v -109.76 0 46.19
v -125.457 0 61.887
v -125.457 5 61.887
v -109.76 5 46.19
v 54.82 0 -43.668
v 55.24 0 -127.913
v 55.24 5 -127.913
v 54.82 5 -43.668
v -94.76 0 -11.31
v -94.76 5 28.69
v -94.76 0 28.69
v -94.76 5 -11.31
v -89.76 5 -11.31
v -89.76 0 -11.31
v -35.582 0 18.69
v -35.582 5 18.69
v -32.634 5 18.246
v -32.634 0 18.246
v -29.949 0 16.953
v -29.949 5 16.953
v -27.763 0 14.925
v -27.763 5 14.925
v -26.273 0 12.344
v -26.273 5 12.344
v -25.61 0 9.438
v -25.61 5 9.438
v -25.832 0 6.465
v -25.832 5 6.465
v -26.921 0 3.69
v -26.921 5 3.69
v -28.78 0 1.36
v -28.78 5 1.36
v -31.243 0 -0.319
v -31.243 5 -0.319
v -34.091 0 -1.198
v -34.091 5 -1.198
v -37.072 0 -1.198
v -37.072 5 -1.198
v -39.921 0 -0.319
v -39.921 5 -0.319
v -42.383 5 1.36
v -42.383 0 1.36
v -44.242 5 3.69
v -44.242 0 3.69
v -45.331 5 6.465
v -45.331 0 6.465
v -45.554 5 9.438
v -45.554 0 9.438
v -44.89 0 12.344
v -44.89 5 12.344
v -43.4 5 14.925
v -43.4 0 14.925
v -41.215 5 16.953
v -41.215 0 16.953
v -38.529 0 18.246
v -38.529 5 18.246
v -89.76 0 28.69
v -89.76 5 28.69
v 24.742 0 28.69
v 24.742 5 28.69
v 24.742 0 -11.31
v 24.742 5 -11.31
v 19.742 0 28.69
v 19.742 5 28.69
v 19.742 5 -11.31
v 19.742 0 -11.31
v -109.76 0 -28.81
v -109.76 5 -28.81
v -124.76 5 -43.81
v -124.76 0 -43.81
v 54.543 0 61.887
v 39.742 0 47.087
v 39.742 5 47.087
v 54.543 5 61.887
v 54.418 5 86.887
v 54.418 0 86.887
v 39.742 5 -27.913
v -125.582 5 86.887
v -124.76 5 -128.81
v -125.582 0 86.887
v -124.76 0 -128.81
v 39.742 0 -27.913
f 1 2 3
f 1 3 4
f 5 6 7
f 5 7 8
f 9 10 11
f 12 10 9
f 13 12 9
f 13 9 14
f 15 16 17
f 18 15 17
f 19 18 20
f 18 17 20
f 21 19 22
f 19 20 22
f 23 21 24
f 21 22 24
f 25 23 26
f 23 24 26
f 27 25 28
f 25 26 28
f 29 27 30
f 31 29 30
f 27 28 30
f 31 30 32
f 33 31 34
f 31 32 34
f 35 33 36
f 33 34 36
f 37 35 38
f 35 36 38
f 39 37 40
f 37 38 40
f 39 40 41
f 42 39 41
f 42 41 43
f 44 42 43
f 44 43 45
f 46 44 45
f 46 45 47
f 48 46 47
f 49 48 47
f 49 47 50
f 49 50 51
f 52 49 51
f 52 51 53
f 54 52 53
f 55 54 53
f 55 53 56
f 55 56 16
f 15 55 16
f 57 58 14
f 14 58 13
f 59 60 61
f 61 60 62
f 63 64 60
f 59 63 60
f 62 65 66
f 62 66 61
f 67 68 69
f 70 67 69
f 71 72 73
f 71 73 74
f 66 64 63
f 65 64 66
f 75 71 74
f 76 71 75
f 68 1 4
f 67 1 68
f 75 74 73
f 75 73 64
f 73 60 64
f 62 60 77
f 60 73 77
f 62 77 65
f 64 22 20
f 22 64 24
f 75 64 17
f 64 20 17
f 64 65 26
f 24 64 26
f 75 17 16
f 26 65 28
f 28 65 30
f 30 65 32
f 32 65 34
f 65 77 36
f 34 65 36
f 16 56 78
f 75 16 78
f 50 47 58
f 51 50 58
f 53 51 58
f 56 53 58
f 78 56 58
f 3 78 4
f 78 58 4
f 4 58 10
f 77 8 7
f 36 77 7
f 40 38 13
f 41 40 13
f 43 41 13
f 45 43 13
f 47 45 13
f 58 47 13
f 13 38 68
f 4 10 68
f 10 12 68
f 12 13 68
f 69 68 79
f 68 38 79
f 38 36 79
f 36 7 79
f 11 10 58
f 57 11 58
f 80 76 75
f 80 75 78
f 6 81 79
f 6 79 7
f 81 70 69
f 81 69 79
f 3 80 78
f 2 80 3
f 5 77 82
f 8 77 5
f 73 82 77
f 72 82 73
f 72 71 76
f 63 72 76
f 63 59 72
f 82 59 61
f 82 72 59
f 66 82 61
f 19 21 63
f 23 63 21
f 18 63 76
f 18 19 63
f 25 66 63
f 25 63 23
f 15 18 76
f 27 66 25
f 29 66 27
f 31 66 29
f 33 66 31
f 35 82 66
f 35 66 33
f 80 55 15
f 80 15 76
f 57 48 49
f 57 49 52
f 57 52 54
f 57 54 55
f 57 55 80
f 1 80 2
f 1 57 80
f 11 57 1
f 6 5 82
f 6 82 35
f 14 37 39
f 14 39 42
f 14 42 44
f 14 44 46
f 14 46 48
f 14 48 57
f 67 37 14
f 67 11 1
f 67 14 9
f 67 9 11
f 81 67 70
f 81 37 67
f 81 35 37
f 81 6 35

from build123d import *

# Parameters (mm, degrees)
BOSS_EXTRUDE1_DEPTH = 5
CUT_EXTRUDE2_DEPTH  = 5
SKETCH5_W           = 5
SKETCH5_H           = 40
CUT_EXTRUDE3_DEPTH  = 10
SKETCH6_R           = 10
CUT_EXTRUDE4_DEPTH  = 10


with BuildPart() as part:
    # Sketch2 → Boss-Extrude1 (new body)
    with BuildSketch(Plane(origin=(0, 0, 0), x_dir=(1, 0, 0), z_dir=(0, 1, 0))):
        Polygon((-124.760229314, 128.809560066), (55.239770686, 127.913370731), (54.741887722, 27.913370731), (39.741887722, 27.913370731), (39.741887722, -47.086629269), (54.542734536, -61.887476084), (54.418263795, -86.887476084), (-125.581736205, -86.887476084), (-125.457265464, -61.887476084), (-109.760229314, -46.190439934), (-109.760229314, 28.809560066), (-124.760229314, 28.809560066), align=None)
    extrude(amount=BOSS_EXTRUDE1_DEPTH)

    # Sketch4 → Cut-Extrude2 (cut)
    with BuildSketch(Plane(origin=(0, 5, 0), x_dir=(1, 0, 0), z_dir=(0, 1, 0))):
        Polygon((-109.760229314, 28.809560066), (-124.760229314, 43.809560066), (-124.760229314, 28.809560066), align=None)
        Polygon((39.741887722, 27.913370731), (54.820327412, 43.668014969), (54.741887722, 27.913370731), align=None)
    extrude(amount=-CUT_EXTRUDE2_DEPTH, mode=Mode.SUBTRACT)

    # Sketch5 → Cut-Extrude3 (cut)
    with BuildSketch(Plane(origin=(0, 5, 0), x_dir=(1, 0, 0), z_dir=(0, 1, 0))):
        with Locations((-92.260229314, -8.690439934)):
            Rectangle(SKETCH5_W, SKETCH5_H)
        with Locations((22.241887722, -8.690439934)):
            Rectangle(SKETCH5_W, SKETCH5_H)
    extrude(amount=-CUT_EXTRUDE3_DEPTH, mode=Mode.SUBTRACT)

    # Sketch6 → Cut-Extrude4 (cut)
    with BuildSketch(Plane(origin=(0, 5, 0), x_dir=(1, 0, 0), z_dir=(0, 1, 0))):
        with Locations(Location((-35.581736205, -8.690439934, 0), (0, 0, 270))):
            Circle(SKETCH6_R)
    extrude(amount=-CUT_EXTRUDE4_DEPTH, mode=Mode.SUBTRACT)


solid = part.part
